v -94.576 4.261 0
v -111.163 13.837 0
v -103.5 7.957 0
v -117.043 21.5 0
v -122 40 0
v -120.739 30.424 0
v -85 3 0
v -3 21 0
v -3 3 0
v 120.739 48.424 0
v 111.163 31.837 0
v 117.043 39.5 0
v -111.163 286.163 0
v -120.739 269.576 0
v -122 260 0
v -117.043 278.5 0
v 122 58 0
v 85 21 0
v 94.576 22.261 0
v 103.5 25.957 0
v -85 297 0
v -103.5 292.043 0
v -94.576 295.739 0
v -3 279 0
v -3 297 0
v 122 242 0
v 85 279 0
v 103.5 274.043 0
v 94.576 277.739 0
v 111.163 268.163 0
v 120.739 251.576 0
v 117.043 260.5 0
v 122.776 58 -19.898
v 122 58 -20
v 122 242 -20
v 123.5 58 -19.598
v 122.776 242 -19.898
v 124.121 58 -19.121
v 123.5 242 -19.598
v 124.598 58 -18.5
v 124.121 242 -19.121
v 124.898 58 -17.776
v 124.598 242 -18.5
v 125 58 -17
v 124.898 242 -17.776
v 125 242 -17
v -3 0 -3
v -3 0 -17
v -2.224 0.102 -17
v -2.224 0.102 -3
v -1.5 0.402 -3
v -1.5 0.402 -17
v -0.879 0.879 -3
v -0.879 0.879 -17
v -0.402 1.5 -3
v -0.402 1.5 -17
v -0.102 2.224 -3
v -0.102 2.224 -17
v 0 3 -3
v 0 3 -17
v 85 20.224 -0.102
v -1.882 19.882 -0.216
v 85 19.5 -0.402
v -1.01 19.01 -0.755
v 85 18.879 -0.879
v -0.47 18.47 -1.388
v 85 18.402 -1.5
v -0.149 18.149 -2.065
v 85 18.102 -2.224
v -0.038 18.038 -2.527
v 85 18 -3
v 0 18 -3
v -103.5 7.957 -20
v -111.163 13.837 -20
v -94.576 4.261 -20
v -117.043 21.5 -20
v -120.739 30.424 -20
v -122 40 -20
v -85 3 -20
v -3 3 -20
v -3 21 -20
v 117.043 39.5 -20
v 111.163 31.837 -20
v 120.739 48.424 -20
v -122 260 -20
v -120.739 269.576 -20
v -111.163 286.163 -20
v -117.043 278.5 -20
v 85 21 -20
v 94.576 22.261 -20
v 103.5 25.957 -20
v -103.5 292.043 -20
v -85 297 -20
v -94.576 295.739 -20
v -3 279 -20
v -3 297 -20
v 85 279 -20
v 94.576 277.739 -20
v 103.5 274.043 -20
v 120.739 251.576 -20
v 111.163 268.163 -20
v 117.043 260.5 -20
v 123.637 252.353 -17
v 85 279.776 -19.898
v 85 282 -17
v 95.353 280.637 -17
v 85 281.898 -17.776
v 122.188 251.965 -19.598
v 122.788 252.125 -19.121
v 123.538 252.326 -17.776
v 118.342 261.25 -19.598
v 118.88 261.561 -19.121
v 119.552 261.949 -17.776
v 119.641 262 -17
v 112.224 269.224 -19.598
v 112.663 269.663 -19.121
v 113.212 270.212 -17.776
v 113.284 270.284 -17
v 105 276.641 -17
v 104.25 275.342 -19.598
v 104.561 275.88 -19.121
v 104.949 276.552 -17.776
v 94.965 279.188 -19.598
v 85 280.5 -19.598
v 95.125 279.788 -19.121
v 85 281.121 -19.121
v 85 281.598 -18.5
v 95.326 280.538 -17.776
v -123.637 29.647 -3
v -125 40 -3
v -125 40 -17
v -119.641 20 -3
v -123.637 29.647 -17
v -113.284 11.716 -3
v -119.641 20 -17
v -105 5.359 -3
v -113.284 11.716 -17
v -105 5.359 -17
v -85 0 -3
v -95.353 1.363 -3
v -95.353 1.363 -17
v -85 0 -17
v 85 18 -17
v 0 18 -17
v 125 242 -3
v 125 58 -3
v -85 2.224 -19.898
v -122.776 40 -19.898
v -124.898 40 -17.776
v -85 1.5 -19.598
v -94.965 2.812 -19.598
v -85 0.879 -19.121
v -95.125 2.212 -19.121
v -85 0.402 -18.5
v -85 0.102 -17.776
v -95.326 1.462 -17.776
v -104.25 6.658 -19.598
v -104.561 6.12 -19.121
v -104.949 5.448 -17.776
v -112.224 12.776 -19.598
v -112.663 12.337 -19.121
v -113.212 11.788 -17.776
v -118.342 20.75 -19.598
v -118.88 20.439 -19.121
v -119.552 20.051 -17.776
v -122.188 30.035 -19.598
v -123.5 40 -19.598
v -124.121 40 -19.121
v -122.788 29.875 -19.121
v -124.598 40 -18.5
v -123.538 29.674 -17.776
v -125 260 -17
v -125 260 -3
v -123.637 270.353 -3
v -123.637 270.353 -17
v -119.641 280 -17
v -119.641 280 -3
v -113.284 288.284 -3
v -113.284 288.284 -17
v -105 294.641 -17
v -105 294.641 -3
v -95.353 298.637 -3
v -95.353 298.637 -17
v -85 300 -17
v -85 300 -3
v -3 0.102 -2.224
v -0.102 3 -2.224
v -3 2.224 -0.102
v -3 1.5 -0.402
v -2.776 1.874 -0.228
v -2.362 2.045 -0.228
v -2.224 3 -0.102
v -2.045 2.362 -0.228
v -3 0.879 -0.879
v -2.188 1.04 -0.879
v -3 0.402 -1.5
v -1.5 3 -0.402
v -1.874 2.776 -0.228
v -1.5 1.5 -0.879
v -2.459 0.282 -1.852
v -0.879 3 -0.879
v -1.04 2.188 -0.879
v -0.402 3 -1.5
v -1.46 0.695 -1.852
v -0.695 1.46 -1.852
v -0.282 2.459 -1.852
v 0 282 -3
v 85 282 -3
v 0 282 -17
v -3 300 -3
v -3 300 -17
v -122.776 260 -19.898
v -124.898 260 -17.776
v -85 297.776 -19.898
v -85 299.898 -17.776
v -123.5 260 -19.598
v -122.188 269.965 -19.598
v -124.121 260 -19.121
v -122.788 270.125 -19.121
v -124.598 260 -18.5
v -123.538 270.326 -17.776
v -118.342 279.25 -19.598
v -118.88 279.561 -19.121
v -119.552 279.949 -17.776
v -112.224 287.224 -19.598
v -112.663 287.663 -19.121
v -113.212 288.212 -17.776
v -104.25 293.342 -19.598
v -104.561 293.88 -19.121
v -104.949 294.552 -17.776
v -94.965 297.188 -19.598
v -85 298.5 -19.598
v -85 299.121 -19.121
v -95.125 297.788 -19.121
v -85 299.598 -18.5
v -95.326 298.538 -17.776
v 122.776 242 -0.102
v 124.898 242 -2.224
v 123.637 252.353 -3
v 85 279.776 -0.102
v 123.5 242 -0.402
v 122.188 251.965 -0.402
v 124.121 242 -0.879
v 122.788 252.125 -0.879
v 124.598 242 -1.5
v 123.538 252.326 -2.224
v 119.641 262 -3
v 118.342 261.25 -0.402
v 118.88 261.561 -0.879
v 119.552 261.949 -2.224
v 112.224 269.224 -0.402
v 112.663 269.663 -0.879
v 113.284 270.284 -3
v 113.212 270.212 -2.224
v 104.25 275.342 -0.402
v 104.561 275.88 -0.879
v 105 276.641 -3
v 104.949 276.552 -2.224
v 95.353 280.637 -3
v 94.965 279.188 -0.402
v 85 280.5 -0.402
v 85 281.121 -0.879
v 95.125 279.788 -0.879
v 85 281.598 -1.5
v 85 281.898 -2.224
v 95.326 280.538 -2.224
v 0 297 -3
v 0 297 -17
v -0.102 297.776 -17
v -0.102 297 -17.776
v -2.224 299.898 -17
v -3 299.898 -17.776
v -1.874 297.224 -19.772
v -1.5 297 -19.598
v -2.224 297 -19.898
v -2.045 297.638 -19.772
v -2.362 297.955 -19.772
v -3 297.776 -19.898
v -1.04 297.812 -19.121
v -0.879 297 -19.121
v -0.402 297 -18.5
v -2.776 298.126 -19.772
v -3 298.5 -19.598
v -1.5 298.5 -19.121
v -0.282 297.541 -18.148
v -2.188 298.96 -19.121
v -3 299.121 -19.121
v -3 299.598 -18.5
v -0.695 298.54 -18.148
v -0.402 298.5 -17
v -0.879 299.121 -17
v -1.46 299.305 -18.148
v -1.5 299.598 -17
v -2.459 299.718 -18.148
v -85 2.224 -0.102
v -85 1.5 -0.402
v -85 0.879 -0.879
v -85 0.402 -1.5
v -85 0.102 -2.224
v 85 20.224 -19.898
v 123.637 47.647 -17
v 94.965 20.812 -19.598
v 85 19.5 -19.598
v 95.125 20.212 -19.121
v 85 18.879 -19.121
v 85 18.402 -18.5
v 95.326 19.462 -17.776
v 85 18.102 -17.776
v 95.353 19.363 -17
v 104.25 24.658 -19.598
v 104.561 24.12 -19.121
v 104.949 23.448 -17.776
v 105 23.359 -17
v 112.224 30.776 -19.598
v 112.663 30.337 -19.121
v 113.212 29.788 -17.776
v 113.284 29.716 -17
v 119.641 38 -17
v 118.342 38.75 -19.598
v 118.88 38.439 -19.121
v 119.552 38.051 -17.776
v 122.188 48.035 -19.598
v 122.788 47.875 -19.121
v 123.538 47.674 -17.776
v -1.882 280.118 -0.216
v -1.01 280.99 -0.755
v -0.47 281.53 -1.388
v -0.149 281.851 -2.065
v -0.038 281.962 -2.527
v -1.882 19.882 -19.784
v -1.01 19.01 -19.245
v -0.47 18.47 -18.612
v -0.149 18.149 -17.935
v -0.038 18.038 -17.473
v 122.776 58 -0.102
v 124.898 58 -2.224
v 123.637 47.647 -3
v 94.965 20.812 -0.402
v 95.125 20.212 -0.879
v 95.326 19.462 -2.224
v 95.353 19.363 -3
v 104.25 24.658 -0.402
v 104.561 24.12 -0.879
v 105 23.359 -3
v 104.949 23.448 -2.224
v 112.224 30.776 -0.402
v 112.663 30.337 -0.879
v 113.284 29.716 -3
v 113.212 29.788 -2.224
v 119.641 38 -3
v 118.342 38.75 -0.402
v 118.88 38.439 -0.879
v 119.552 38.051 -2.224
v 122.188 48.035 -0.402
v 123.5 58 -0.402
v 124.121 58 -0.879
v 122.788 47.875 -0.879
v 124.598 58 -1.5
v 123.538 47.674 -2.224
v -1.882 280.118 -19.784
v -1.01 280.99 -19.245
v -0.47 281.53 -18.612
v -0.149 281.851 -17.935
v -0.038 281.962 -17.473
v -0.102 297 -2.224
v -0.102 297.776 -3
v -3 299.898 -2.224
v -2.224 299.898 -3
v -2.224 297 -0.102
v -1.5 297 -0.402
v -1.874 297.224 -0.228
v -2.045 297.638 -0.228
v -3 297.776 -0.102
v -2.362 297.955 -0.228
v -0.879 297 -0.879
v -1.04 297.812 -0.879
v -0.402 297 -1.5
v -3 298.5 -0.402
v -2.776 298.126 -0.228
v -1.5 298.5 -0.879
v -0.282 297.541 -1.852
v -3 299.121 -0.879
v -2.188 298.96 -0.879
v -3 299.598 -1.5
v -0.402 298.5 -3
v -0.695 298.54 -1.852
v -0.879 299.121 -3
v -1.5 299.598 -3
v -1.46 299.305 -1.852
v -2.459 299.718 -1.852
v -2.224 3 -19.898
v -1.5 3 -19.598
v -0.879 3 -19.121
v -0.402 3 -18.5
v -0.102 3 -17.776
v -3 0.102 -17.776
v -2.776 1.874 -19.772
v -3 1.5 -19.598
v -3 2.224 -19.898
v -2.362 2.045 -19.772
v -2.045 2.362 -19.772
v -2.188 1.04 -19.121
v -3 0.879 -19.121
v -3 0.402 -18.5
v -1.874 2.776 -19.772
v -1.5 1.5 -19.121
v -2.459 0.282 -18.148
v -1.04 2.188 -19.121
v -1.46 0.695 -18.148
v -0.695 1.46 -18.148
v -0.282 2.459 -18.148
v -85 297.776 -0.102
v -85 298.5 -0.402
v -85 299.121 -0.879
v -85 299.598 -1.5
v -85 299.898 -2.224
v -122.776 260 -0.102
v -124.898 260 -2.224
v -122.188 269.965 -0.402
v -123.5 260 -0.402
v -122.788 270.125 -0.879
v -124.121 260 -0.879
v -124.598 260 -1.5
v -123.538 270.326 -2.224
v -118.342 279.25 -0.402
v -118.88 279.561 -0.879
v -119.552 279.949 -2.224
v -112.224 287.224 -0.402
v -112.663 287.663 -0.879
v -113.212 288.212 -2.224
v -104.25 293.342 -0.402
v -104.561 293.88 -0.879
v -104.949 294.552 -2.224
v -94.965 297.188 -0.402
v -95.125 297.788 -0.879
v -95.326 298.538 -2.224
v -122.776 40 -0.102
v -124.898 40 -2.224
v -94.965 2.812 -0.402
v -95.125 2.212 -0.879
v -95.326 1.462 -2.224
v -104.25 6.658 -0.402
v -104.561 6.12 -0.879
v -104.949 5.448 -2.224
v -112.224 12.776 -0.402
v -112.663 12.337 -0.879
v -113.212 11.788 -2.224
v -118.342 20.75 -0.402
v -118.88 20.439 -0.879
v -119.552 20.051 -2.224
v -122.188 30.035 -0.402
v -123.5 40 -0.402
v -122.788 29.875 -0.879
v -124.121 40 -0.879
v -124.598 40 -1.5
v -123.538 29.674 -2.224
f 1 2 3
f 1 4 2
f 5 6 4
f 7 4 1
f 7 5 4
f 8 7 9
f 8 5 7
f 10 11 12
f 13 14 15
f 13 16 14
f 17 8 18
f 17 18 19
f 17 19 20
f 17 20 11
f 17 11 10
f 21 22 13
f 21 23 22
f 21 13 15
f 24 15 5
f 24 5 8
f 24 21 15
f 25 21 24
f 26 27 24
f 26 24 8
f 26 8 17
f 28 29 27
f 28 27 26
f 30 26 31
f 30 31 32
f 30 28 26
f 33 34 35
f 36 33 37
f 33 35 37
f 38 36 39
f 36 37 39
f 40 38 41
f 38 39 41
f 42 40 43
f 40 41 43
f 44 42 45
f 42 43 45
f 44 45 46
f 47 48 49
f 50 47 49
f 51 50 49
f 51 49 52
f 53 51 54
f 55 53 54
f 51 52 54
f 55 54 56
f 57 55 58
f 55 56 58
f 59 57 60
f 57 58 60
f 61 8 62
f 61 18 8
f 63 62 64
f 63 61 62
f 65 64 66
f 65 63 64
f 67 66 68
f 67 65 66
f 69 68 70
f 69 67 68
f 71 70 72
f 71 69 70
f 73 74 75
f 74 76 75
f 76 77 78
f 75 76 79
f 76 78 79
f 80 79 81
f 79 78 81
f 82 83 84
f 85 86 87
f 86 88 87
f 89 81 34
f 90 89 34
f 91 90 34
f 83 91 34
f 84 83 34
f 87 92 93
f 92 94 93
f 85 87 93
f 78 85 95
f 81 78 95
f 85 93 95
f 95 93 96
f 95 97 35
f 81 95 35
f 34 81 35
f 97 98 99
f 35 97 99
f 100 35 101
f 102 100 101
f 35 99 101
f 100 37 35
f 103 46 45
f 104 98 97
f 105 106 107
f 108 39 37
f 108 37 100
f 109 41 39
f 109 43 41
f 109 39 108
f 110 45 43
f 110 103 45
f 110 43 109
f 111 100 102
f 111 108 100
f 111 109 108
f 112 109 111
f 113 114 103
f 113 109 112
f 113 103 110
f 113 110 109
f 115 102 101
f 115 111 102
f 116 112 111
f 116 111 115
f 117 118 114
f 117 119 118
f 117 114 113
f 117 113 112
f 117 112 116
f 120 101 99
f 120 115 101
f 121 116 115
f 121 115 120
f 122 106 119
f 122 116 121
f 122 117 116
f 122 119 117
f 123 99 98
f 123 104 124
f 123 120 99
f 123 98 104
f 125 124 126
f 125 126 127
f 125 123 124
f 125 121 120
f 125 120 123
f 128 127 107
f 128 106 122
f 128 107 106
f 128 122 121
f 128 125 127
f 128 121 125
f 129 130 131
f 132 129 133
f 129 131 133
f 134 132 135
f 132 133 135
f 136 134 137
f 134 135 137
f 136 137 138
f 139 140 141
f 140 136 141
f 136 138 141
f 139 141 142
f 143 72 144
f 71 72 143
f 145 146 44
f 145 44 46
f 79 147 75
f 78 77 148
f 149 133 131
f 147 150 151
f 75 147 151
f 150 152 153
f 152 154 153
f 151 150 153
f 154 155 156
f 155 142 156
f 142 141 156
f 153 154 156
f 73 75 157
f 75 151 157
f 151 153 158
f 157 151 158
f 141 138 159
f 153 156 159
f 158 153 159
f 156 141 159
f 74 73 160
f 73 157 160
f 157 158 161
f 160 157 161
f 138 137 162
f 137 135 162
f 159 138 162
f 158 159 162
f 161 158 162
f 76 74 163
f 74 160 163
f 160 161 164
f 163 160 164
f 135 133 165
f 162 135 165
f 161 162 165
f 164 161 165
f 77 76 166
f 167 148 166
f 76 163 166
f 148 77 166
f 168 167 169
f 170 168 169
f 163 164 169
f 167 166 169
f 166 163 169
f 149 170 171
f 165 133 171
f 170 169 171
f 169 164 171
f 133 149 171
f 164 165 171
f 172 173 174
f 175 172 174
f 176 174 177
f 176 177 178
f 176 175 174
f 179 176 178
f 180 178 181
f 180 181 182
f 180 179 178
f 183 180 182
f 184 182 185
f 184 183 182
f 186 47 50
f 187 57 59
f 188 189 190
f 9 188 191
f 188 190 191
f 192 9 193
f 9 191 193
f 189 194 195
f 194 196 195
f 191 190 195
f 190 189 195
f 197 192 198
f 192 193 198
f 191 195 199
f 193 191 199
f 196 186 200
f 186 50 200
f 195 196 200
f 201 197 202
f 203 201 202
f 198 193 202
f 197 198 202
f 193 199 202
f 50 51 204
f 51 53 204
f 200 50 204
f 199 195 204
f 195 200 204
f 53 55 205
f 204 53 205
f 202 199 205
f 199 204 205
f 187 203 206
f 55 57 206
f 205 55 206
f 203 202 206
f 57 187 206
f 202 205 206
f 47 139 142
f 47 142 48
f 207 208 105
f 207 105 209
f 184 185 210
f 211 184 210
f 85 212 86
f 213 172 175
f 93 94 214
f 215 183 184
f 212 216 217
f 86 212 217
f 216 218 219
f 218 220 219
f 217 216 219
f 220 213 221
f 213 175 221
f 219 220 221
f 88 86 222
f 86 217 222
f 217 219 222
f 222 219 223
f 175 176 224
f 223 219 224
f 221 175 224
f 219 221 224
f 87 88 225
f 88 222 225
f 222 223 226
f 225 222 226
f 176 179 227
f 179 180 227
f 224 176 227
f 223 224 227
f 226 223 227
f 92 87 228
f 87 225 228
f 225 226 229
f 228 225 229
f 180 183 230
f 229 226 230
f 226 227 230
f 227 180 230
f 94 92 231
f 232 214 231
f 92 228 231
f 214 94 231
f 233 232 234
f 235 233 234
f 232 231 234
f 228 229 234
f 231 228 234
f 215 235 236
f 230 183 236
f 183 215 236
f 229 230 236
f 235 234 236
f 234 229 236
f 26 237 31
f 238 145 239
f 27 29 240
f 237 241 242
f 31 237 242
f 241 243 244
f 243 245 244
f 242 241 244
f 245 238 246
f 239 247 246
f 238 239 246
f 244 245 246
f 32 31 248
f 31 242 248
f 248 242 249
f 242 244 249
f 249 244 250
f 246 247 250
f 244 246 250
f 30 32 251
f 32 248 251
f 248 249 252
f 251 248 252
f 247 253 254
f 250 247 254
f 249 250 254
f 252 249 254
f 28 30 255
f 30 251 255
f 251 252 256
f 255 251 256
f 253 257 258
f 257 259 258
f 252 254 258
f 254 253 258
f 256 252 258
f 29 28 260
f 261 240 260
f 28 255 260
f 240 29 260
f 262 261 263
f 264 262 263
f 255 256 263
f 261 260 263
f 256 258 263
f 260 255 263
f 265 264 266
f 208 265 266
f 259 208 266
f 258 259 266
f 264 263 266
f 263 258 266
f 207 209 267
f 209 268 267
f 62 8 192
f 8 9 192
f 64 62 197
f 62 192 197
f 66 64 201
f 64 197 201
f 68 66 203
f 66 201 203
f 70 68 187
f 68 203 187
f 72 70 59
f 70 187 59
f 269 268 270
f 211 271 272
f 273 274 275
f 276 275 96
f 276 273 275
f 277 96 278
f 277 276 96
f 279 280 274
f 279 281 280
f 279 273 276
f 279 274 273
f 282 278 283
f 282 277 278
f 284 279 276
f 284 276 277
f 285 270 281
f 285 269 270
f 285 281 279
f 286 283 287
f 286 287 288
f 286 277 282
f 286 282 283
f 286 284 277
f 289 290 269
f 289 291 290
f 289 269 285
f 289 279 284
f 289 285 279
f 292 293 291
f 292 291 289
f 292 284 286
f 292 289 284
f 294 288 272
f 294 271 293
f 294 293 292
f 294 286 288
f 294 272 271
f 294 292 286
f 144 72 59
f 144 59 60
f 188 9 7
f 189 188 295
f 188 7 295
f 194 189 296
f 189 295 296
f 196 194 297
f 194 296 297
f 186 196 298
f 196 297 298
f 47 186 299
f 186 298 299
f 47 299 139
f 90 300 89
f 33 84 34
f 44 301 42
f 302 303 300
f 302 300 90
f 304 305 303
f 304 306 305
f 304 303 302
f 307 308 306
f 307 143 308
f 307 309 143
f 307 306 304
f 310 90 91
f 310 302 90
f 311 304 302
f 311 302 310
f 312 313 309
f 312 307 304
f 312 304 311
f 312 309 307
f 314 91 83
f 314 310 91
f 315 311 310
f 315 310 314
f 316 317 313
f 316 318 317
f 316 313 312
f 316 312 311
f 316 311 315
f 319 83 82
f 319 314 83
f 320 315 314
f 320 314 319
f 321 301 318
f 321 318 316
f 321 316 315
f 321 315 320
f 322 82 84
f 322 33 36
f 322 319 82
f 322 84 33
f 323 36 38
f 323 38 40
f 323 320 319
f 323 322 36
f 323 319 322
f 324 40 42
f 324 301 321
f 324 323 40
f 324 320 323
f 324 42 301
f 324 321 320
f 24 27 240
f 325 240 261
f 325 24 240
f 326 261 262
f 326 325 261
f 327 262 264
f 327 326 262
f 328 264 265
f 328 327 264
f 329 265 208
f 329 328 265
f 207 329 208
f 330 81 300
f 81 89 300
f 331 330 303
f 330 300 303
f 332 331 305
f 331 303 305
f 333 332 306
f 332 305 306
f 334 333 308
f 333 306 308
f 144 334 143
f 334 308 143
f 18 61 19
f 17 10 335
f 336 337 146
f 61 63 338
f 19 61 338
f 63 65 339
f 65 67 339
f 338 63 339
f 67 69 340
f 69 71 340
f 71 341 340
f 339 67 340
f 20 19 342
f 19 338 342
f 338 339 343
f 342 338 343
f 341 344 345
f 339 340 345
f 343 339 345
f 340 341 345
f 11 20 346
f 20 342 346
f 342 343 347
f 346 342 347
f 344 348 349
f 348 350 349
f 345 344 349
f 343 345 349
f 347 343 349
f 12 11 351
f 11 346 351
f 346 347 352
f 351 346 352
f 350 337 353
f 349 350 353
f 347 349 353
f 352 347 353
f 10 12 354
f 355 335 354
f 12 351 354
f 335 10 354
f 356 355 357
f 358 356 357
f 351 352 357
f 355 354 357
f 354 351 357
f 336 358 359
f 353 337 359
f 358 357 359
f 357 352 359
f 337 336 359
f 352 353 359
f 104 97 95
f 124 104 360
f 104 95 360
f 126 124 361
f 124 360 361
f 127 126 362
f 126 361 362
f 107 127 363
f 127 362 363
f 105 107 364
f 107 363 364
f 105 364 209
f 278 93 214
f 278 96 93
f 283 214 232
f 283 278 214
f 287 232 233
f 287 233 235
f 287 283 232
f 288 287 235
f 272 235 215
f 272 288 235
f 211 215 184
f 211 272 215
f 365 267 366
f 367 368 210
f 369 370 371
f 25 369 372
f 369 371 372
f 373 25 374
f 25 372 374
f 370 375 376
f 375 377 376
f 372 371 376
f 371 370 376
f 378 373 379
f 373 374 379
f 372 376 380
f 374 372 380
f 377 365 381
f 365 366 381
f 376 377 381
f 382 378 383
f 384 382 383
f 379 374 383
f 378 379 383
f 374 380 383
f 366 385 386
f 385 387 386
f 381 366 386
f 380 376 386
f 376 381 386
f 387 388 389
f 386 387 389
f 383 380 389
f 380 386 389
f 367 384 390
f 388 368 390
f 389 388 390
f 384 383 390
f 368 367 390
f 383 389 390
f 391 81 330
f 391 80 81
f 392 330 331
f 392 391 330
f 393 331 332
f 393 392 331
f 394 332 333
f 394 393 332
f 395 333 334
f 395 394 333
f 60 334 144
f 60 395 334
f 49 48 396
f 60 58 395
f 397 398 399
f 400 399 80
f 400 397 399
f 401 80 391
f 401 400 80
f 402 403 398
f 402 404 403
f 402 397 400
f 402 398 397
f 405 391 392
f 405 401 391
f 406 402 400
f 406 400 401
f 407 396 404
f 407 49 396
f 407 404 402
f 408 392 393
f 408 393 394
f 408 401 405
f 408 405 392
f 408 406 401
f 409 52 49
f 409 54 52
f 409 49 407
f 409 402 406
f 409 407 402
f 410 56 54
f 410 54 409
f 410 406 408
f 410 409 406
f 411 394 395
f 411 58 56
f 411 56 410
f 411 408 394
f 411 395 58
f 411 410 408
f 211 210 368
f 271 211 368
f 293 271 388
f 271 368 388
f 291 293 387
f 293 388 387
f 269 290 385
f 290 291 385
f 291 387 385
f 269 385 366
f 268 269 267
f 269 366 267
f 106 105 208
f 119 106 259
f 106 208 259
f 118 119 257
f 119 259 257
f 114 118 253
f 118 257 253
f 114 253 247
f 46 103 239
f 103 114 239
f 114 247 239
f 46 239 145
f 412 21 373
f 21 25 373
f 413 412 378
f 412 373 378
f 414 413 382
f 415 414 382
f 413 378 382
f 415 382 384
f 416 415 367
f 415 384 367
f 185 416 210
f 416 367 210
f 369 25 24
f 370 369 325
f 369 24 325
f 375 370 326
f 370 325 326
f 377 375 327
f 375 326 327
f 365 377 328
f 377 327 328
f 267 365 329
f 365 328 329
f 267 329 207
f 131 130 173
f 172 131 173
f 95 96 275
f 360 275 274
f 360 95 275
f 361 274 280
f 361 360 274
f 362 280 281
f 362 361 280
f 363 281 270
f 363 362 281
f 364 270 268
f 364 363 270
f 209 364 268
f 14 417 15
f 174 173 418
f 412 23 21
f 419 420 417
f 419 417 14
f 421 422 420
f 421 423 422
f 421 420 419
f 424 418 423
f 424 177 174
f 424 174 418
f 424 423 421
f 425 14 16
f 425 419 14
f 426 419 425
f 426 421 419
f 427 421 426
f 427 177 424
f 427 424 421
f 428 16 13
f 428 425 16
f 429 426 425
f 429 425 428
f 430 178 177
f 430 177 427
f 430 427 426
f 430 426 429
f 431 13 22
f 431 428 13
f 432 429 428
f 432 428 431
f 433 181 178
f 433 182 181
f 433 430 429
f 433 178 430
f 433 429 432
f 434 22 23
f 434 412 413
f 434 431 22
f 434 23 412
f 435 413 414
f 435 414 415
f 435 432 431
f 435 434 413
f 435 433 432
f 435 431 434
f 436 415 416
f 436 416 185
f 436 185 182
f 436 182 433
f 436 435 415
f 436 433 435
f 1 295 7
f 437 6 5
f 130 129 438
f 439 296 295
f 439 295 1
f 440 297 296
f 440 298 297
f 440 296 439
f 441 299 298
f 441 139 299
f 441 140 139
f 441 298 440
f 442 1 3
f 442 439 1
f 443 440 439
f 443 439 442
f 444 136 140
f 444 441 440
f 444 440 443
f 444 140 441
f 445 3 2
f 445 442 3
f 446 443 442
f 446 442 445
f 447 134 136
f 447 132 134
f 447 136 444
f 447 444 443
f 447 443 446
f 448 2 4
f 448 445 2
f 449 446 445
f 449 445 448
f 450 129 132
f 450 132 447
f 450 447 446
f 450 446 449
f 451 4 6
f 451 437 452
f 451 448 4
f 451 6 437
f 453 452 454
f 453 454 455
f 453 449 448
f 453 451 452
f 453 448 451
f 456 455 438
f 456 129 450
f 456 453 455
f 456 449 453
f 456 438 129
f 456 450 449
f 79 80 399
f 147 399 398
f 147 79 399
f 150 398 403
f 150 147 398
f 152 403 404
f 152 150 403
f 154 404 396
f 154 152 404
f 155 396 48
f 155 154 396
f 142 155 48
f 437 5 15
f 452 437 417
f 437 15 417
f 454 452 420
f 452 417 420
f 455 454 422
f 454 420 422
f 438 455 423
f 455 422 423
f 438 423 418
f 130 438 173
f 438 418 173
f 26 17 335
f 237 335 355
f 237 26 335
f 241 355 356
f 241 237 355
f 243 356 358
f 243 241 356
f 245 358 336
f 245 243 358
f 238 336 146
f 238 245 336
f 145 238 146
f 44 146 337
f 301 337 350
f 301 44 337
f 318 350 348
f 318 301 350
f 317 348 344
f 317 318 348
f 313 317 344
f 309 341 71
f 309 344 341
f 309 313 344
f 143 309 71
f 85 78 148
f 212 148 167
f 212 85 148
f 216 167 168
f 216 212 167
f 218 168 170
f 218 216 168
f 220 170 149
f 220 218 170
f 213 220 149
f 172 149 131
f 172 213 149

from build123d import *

# Parameters (mm, degrees)
F1_W     = 250
F1_H     = 300
F2_DEPTH = 20
F3_DEPTH = 18
F4_W     = 125
F4_H     = 20
F5_DEPTH = 18
F6_R     = 40
F7_R     = 3


with BuildPart() as f2:
    # F1 (on Top) → F2 (new body)
    with BuildSketch(Plane.XY):
        with Locations((0, 150)):
            Rectangle(F1_W, F1_H)
    extrude(amount=-F2_DEPTH)

    # F0 (on Front) → F3 (cut)
    with BuildSketch(Plane.XZ):
        with BuildLine():
            ThreePointArc((160.7967353507, 4.0303440201), (159.065909211, 1.1368225578), (155.8916596855, 0))
            Line((155.8916596855, 0), (45.0975336134, 0))
            Line((45.0975336134, 0), (45.0975336134, -5))
            Line((45.0975336134, -5), (0, -5))
            Line((0, -5), (0, -20.7676107392))
            ThreePointArc((0, -20.7676107392), (2.6525588341, -27.5510544306), (9.2030216628, -30.7358014241))
            Line((9.2030216628, -30.7358014241), (175.0106296305, -43.9924771707))
            ThreePointArc((175.0106296305, -43.9924771707), (194.4976732451, -37.7783808724), (204.0363591727, -19.684919832))
            Line((204.0363591727, -19.684919832), (219.923475276, 144.1129544091))
            ThreePointArc((219.923475276, 144.1129544091), (217.690858581, 151.4337512548), (210.9355750829, 155.0316379433))
            Line((210.9355750829, 155.0316379433), (195.5381857284, 156.525064604))
            ThreePointArc((195.5381857284, 156.525064604), (192.0716412109, 155.5604813638), (190.150414228, 152.518074652))
            Line((190.150414228, 152.518074652), (160.7967353507, 4.0303440201))
        make_face()
        with BuildLine():
            Line((45.0975336134, -5), (45.0975336134, 0))
            Line((45.0975336134, 0), (5, 0))
            ThreePointArc((5, 0), (1.4644660941, -1.4644660941), (0, -5))
            Line((0, -5), (45.0975336134, -5))
        make_face()
        with BuildLine():
            Line((5, 0), (45.0975336134, 0))
            Line((45.0975336134, 0), (45.0975336134, 7.6496871188))
            Line((45.0975336134, 7.6496871188), (0, 7.6496871188))
            Line((0, 7.6496871188), (0, -5))
            ThreePointArc((0, -5), (1.4644660941, -1.4644660941), (5, 0))
        make_face()
    extrude(amount=-F3_DEPTH, mode=Mode.SUBTRACT)

    # F4 (on face) → F5 (cut)
    with BuildSketch(Plane(origin=(0, 300, 0), x_dir=(-1, 0, 0), z_dir=(0, 1, 0))):
        with Locations((-62.5, -10)):
            Rectangle(F4_W, F4_H)
    extrude(amount=-F5_DEPTH, mode=Mode.SUBTRACT)

    # F6
    f6_edges = [f2.edges().sort_by_distance(p)[0] for p in [
        (-125, 300, -10),
        (-125, 0, -10),
        (125, 282, -10),
        (125, 18, -10),
    ]]
    fillet(f6_edges, radius=F6_R)

    # F7
    f7_edges = [f2.edges().sort_by_distance(p)[0] for p in [
        (0, 0, -10),
        (0, 300, -10),
        (42.5, 282, 0),
        (113.284271, 270.284271, 0),
        (0, 291, 0),
        (125, 150, 0),
        (-42.5, 300, 0),
        (113.284271, 29.715729, 0),
        (-113.284271, 288.284271, 0),
        (42.5, 18, 0),
        (-125, 150, 0),
        (0, 9, 0),
        (-113.284271, 11.715729, 0),
        (-42.5, 0, 0),
        (42.5, 282, -20),
        (113.284271, 270.284271, -20),
        (0, 291, -20),
        (125, 150, -20),
        (-42.5, 300, -20),
        (113.284271, 29.715729, -20),
        (-113.284271, 288.284271, -20),
        (42.5, 18, -20),
        (-125, 150, -20),
        (0, 9, -20),
        (-113.284271, 11.715729, -20),
        (-42.5, 0, -20),
    ]]
    fillet(f7_edges, radius=F7_R)


solid = f2.part
